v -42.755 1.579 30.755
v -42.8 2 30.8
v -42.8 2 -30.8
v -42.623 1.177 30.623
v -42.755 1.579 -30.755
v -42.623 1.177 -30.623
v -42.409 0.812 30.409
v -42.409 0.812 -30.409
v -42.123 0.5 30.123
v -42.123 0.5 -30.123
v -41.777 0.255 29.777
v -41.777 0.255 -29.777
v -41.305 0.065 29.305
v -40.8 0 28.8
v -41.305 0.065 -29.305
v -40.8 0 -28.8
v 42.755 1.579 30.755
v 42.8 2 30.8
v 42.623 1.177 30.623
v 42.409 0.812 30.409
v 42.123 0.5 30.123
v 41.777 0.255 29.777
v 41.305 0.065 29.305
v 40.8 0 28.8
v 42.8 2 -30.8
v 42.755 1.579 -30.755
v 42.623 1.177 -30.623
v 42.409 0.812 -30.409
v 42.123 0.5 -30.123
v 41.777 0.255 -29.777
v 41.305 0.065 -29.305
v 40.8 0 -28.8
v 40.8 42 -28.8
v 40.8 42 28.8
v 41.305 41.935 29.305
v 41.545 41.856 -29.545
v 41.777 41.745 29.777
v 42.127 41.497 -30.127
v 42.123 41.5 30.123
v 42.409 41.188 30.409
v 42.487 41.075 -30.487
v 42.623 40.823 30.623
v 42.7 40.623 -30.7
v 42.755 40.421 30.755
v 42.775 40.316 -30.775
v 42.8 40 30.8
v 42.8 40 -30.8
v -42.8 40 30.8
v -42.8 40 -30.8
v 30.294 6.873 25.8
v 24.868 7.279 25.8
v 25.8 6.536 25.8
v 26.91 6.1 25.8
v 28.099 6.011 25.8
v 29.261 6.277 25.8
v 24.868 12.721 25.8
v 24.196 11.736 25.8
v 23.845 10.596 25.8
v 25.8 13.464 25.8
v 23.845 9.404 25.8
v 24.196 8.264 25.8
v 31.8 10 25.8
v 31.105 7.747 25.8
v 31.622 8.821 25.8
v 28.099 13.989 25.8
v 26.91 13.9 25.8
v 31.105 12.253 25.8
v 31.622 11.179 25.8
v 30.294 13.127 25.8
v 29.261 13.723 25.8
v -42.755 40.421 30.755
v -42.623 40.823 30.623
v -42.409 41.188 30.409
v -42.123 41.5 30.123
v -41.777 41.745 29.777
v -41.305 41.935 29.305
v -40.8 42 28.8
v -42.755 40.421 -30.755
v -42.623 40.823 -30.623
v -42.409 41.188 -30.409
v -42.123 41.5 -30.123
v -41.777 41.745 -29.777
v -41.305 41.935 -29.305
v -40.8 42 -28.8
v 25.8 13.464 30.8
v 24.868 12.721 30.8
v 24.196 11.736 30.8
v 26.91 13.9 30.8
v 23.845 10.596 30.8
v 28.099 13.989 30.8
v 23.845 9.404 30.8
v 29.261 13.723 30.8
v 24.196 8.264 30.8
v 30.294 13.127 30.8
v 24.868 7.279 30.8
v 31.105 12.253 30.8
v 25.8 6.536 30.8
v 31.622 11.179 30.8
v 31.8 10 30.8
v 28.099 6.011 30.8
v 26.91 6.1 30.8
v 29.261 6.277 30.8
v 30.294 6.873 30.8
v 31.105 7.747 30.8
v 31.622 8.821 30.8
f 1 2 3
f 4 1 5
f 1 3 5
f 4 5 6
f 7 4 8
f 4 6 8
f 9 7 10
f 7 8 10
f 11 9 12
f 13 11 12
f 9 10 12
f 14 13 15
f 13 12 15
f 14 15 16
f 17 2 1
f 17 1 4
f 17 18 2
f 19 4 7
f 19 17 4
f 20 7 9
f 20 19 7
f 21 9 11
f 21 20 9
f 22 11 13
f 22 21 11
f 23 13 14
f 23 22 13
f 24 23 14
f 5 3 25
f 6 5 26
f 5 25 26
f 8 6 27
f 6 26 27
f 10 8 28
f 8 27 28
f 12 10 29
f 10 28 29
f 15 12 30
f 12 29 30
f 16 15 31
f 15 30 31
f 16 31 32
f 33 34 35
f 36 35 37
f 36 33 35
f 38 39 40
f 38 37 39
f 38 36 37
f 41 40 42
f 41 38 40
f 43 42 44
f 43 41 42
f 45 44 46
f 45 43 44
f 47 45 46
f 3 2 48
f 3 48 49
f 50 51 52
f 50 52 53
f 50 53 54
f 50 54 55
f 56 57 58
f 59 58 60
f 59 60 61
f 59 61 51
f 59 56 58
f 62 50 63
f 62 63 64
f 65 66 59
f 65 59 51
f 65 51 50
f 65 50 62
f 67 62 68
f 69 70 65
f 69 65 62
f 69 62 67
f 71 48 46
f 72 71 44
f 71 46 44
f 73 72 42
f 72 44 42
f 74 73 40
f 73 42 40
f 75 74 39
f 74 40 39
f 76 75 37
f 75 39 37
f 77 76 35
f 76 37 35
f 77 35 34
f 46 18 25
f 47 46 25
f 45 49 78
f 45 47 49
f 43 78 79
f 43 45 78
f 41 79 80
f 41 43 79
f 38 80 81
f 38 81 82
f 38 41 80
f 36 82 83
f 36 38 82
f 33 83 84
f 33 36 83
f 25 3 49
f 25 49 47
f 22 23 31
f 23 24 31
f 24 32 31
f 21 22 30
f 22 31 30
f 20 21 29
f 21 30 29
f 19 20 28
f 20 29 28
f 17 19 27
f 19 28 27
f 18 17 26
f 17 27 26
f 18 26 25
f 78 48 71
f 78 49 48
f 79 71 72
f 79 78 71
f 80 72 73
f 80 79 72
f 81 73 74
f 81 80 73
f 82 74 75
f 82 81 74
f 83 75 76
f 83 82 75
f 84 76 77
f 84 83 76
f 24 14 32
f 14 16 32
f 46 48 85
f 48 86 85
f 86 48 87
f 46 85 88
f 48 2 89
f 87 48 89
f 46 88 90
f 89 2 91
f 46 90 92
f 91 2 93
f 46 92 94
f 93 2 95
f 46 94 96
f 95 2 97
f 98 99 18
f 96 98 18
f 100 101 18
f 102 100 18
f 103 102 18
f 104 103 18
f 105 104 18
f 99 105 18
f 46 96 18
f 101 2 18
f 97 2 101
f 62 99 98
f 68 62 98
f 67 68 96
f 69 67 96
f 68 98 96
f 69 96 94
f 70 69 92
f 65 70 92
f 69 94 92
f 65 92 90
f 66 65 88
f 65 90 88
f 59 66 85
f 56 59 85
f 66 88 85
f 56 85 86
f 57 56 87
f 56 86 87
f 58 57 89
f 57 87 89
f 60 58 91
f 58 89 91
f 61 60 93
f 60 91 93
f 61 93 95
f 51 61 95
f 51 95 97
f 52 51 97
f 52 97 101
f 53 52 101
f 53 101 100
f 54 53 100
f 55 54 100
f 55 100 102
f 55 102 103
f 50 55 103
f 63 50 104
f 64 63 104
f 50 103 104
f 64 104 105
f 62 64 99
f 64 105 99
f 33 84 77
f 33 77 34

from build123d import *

# Parameters (mm, degrees)
SKETCH_1_W          = 85.6
SKETCH_1_H          = 61.6
EXTRUDE_1_DEPTH     = 42
SKETCH_2_R          = 4
CUT_EXTRUDE_1_DEPTH = 5
FILLET_1_R          = 2


with BuildPart() as part:
    # 草图1 → 凸台-拉伸1 (new body)
    with BuildSketch(Plane(origin=(0, 0, 0), x_dir=(1, 0, 0), z_dir=(0, 1, 0))):
        Rectangle(SKETCH_1_W, SKETCH_1_H)
    extrude(amount=EXTRUDE_1_DEPTH)

    # 草图2 → 切除-拉伸1 (cut)
    with BuildSketch(Plane.XY.offset(30.8)):
        with Locations((27.8, 10)):
            Circle(SKETCH_2_R)
    extrude(amount=-CUT_EXTRUDE_1_DEPTH, mode=Mode.SUBTRACT)

    # 圆角1
    fillet_1_edges = [part.edges().sort_by_distance(p)[0] for p in [
        (-42.8, 42, 0),
        (0, 42, 30.8),
        (42.8, 42, 0),
        (0, 0, 30.8),
        (-42.8, 0, 0),
        (0, 0, -30.8),
        (42.8, 0, 0),
        (0, 42, -30.8),
    ]]
    fillet(fillet_1_edges, radius=FILLET_1_R)


solid = part.part
